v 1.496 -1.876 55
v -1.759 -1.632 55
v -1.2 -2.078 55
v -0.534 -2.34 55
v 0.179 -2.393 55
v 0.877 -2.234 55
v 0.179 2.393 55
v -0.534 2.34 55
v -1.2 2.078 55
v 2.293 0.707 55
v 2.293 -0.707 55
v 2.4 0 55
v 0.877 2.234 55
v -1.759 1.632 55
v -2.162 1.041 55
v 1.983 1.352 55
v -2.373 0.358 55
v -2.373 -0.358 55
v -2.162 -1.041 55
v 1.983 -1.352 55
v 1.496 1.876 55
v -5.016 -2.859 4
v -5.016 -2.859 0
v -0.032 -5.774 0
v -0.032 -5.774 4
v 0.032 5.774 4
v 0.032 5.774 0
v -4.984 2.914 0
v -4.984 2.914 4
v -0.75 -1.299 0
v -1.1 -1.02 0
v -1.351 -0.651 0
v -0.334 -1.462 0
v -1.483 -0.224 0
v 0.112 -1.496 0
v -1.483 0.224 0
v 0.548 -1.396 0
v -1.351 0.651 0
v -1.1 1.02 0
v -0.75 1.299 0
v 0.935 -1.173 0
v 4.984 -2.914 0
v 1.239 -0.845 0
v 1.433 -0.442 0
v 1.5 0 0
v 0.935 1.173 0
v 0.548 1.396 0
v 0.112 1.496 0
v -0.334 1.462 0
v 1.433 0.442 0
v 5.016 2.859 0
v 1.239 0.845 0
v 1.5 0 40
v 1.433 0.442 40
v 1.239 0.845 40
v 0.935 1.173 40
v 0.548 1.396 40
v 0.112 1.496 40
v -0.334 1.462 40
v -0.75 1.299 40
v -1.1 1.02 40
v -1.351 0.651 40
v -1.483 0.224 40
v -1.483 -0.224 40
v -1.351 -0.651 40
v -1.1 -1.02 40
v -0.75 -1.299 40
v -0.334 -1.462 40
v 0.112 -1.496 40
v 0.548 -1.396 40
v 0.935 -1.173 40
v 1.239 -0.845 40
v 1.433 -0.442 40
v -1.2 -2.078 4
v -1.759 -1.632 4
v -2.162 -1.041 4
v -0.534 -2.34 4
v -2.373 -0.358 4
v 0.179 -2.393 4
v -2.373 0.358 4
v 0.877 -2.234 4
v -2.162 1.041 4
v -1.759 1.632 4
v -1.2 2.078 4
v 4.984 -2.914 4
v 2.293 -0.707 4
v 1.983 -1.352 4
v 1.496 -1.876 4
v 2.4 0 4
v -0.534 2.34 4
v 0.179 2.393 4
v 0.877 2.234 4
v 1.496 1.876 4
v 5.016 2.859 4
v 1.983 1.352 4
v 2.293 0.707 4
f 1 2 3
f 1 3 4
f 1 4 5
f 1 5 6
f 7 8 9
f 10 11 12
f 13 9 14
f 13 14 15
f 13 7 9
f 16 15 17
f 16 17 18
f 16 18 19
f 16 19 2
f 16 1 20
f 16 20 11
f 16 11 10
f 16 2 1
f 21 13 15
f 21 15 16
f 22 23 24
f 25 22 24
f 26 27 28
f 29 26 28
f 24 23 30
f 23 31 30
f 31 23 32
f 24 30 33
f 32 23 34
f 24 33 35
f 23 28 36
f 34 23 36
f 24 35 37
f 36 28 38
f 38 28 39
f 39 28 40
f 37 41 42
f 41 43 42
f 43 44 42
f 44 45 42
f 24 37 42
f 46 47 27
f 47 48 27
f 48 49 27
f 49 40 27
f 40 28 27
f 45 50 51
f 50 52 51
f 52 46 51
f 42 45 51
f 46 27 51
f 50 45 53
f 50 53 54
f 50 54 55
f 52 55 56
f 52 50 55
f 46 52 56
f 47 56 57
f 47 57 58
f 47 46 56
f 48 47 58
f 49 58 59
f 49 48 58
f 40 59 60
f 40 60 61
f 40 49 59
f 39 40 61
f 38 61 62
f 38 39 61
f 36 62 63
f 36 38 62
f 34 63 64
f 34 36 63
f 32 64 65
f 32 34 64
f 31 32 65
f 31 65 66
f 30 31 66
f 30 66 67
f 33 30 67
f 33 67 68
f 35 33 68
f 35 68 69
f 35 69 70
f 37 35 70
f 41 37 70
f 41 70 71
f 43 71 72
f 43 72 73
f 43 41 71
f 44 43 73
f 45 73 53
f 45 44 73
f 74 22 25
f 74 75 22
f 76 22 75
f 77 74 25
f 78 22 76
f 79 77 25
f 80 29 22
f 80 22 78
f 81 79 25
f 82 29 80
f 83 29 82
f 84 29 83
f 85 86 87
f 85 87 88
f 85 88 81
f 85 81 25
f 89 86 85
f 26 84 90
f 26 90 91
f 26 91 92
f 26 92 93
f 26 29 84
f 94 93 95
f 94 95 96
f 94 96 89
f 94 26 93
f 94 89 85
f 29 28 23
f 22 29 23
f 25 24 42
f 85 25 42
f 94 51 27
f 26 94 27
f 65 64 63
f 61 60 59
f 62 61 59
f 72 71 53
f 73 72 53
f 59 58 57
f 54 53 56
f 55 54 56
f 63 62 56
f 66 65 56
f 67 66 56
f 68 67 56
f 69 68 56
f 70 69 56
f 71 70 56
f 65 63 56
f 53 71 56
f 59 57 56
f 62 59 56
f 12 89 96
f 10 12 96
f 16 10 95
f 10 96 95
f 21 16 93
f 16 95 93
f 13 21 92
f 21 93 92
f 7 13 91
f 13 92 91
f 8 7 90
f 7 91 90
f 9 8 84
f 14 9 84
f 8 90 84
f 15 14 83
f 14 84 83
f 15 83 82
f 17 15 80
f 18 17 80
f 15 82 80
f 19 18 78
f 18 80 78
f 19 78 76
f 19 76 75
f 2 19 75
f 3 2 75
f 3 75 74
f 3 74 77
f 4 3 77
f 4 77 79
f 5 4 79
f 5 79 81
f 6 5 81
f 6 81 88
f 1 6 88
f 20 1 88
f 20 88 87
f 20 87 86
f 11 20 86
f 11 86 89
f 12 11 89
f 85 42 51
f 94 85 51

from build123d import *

# Parameters (mm, degrees)
F1_DEPTH = 4
F2_R     = 2.4
F3_DEPTH = 55
F4_R     = 1.5
F5_DEPTH = 40


with BuildPart() as f1:
    # F0 (on Top) → F1 (new body)
    with BuildSketch(Plane.XY):
        Polygon((-0.031572, -5.773503), (4.984214, -2.914093), (5.015786, 2.859409), (0.031572, 5.773503), (-4.984214, 2.914093), (-5.015786, -2.859409), align=None)
    extrude(amount=F1_DEPTH)

    # F2 (on face) → F3 (join)
    with BuildSketch(Plane.XY):
        Circle(F2_R)
    extrude(amount=F3_DEPTH)

    # F4 (on Top) → F5 (cut)
    with BuildSketch(Plane.XY):
        Circle(F4_R)
    extrude(amount=F5_DEPTH, mode=Mode.SUBTRACT)


solid = f1.part
